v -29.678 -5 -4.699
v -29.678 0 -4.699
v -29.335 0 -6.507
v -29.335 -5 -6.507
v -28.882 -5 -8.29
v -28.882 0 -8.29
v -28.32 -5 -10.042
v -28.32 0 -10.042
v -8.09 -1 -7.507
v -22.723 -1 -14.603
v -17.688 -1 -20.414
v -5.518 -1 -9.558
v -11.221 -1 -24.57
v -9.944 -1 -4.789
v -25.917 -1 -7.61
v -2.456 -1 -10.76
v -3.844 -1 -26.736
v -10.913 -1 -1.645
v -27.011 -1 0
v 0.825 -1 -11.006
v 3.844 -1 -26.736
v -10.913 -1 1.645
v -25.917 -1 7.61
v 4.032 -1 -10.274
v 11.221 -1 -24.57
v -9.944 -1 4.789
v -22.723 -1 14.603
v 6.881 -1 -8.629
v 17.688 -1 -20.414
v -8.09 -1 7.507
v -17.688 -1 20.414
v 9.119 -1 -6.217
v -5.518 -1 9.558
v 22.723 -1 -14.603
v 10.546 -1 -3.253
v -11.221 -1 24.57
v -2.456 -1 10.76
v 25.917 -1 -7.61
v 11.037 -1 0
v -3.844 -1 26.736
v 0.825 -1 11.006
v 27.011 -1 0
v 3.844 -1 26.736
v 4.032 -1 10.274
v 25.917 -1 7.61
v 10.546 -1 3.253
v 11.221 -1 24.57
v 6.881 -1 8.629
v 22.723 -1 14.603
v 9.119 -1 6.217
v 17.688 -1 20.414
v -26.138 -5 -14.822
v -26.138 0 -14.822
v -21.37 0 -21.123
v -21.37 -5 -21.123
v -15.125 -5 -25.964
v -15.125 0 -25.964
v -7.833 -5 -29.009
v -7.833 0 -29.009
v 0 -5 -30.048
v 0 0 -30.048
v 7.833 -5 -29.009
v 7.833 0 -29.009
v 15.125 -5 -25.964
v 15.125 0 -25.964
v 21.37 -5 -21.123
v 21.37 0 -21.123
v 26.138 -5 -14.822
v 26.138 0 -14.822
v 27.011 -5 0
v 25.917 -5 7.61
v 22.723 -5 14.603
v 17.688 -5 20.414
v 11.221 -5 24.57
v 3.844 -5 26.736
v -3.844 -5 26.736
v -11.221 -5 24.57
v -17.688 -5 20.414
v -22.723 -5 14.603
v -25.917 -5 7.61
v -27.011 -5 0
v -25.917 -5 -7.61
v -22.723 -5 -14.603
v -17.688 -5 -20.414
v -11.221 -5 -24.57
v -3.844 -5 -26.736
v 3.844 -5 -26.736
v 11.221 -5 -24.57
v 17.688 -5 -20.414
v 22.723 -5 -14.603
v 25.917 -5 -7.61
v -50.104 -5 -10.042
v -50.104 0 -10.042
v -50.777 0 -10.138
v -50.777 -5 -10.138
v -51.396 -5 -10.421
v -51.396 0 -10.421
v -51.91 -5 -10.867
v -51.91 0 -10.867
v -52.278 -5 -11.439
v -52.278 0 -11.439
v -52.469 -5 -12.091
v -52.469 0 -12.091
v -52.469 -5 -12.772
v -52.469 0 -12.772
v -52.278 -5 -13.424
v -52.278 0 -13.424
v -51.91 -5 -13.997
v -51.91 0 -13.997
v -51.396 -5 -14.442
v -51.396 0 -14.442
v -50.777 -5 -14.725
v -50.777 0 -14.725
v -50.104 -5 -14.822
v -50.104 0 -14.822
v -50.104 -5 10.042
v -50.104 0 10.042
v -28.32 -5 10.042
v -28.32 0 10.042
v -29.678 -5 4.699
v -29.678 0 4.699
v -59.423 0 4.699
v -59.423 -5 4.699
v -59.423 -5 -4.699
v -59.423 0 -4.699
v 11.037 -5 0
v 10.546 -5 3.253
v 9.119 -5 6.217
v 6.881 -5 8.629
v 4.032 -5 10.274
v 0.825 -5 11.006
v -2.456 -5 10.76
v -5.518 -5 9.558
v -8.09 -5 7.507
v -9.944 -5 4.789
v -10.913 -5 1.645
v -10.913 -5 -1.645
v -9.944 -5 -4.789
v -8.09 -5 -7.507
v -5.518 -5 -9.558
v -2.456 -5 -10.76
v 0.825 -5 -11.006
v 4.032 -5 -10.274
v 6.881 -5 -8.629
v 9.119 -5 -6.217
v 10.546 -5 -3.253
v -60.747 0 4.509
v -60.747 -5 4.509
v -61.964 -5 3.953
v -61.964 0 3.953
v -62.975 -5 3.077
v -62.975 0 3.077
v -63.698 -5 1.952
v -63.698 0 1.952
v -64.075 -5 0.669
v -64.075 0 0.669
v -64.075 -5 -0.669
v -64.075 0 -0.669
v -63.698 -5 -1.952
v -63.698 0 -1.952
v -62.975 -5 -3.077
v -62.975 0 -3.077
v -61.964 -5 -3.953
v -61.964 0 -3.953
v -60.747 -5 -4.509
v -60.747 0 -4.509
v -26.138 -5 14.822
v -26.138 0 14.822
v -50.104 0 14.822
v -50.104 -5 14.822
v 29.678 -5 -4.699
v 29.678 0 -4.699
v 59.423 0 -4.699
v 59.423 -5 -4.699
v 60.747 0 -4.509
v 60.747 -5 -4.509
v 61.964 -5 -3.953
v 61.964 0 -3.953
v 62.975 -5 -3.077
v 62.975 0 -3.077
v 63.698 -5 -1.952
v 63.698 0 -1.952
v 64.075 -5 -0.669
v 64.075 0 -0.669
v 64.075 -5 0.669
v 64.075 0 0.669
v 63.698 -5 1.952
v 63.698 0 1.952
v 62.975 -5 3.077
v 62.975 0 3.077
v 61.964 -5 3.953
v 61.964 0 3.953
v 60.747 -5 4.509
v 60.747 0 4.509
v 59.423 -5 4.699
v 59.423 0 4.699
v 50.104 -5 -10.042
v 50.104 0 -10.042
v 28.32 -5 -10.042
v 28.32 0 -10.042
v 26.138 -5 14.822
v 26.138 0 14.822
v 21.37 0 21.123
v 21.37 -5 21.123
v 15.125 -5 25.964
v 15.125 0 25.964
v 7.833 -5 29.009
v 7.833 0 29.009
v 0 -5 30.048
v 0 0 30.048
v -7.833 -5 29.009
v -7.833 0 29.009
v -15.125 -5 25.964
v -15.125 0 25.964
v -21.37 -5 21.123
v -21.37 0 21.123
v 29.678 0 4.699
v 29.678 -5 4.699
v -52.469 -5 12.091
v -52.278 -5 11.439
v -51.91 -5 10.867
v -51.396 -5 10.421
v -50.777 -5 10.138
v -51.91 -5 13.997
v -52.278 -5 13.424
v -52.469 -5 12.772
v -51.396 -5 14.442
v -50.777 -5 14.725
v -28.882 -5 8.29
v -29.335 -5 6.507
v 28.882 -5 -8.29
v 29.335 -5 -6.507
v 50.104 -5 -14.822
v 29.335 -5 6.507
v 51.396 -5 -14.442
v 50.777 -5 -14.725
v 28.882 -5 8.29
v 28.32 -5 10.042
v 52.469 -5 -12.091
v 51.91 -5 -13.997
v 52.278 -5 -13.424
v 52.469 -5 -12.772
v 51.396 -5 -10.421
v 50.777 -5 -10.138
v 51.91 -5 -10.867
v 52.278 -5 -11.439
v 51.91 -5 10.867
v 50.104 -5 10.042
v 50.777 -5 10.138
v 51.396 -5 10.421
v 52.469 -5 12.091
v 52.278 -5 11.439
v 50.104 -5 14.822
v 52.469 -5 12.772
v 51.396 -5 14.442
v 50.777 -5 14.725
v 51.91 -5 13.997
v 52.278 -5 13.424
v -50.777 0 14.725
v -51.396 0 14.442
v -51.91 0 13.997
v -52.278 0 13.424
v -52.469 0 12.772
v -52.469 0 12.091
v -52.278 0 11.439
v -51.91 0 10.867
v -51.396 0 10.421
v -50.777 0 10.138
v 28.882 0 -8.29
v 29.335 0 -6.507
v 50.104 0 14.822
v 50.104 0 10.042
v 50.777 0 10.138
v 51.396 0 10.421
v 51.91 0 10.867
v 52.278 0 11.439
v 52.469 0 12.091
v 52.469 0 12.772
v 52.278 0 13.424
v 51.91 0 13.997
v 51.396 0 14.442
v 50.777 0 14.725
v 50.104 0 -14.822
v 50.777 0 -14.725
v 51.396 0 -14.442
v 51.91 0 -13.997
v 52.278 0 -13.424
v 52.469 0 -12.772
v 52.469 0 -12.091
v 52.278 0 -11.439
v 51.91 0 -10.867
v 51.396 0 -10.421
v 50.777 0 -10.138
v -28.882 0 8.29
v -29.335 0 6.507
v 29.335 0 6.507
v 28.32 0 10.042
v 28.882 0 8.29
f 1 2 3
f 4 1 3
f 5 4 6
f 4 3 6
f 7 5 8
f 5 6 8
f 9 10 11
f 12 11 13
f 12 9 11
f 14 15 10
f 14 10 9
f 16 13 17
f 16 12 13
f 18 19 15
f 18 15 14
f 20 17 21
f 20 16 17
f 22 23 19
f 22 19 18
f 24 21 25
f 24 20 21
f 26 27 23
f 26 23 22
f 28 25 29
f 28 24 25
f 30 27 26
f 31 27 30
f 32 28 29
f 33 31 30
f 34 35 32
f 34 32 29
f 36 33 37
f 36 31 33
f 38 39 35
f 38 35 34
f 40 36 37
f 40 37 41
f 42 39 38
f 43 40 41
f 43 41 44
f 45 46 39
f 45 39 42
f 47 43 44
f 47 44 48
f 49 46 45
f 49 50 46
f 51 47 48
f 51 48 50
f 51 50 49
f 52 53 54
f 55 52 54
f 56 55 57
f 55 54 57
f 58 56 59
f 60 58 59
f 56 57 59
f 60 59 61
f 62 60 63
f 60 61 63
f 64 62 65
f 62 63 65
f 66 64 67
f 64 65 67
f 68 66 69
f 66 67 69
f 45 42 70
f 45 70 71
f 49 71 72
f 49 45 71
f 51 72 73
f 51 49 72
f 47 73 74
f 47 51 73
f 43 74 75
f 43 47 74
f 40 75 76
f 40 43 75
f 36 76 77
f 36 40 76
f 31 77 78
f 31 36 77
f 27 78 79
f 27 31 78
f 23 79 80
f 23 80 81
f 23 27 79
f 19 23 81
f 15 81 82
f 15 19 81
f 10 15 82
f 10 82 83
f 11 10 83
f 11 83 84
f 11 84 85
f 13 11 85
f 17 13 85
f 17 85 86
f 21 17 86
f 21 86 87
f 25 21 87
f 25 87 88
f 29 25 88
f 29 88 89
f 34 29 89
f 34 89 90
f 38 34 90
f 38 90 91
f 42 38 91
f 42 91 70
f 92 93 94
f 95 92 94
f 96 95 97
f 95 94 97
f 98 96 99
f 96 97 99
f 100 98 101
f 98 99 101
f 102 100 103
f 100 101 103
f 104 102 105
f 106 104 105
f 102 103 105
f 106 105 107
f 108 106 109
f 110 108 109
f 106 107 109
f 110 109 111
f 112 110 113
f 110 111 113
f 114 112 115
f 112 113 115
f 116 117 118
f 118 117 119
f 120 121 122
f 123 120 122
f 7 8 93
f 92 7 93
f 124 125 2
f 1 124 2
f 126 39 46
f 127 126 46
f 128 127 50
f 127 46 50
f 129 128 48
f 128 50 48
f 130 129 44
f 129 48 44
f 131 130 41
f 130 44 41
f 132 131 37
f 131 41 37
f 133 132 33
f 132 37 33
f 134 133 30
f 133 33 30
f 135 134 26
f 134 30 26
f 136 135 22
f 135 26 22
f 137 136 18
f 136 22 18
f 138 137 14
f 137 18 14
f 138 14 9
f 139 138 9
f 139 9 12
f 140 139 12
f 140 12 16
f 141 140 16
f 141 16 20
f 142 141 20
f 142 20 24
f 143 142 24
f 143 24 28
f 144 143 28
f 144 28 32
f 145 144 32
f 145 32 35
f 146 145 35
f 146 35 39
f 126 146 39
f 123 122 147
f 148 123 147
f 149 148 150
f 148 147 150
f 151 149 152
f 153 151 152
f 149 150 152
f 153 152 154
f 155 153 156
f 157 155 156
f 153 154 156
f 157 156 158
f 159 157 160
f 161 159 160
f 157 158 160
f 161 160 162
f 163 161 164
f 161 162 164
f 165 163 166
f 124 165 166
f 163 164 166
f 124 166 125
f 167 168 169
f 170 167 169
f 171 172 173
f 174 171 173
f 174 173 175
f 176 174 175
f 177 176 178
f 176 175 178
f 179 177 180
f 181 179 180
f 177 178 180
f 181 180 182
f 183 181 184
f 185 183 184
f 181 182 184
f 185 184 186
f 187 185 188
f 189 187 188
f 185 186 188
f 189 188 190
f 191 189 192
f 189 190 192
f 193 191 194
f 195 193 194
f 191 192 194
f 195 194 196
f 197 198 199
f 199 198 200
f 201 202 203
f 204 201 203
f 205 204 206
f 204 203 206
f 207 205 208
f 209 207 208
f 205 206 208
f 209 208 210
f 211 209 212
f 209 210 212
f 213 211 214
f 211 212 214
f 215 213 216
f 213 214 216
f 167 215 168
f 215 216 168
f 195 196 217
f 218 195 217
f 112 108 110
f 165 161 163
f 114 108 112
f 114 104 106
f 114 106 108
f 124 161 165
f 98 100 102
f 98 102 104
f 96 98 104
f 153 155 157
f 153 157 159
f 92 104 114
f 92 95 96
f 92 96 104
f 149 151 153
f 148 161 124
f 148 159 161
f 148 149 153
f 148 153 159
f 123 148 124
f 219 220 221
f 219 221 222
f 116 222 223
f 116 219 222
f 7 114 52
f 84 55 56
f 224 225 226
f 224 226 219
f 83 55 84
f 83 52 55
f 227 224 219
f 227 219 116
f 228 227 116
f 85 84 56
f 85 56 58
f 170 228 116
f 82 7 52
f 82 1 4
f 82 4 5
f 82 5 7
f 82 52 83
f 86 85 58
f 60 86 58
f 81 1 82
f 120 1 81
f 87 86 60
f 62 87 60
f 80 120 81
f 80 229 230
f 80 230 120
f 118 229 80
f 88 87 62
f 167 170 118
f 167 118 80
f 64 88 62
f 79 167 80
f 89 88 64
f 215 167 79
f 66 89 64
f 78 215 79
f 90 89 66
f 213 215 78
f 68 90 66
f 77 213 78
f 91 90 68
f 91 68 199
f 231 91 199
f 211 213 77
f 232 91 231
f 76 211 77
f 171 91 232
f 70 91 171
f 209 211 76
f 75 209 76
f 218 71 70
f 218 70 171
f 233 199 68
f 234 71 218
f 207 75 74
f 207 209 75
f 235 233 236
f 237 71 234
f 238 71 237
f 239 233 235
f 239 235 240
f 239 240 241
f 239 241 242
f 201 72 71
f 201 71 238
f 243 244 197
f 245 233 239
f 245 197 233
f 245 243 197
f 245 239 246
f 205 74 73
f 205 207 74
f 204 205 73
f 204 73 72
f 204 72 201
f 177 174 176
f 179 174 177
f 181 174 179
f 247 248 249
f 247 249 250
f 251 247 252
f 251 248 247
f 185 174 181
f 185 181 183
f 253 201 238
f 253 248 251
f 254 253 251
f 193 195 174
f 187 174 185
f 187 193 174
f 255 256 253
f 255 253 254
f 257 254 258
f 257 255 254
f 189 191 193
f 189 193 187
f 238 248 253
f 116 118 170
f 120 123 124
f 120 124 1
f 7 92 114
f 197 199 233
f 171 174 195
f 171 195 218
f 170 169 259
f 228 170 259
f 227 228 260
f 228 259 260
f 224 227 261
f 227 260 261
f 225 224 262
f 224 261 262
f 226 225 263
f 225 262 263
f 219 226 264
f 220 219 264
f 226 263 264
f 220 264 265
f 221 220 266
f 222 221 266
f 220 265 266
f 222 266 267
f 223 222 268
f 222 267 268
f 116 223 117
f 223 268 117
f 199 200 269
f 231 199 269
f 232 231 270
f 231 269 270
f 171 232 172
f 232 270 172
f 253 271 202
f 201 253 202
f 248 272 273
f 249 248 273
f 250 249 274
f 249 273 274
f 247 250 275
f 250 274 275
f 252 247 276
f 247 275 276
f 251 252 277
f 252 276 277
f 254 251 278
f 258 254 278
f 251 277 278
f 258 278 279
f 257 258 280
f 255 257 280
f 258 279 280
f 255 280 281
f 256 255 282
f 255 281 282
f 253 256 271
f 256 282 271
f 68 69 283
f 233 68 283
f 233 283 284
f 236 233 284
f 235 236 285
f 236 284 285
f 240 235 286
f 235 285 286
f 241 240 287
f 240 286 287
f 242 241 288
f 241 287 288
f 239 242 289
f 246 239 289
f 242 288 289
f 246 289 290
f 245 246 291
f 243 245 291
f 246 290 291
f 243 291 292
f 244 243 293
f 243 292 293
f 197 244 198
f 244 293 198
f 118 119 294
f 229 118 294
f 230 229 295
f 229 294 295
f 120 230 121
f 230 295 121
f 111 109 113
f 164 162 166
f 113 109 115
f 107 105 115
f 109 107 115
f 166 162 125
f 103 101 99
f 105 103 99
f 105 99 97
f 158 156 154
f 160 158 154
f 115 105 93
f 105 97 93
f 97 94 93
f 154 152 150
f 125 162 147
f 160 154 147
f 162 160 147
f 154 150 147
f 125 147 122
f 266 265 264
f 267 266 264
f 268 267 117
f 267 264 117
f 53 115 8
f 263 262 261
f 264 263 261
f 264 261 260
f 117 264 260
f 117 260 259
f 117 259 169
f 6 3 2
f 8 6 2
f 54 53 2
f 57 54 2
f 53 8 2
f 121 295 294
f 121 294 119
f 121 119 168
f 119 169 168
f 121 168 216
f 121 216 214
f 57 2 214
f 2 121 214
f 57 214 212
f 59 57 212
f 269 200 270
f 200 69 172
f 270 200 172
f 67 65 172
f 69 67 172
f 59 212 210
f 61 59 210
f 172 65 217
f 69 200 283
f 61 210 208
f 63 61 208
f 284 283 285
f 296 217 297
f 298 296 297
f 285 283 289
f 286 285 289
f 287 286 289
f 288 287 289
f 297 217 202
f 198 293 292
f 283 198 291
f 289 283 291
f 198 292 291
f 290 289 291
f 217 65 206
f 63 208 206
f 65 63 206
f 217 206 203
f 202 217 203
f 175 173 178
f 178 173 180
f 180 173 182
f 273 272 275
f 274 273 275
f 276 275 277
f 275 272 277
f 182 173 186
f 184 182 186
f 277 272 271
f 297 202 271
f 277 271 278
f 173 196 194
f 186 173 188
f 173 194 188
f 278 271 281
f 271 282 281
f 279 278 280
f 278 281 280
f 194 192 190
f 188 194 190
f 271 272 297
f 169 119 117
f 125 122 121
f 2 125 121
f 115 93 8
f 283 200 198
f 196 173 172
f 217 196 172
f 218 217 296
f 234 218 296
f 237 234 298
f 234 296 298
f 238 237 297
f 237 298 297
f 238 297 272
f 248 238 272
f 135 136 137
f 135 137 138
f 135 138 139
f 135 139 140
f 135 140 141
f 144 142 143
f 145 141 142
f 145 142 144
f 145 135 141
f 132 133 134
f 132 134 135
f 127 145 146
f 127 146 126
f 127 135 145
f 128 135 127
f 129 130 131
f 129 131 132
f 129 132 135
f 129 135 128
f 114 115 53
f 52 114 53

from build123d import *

# Parameters (mm, degrees)
F0_R     = 27.011072
F0_R_2   = 11.036563
F1_DEPTH = 1
F2_DEPTH = 5


with BuildPart() as f1:
    # F0 (on Front) → F1 (new body)
    with BuildSketch(Plane.XZ):
        Circle(F0_R)
        Circle(F0_R_2, mode=Mode.SUBTRACT)
    extrude(amount=F1_DEPTH)

    # F0 (on Front) → F2 (join)
    with BuildSketch(Plane.XZ):
        with BuildLine():
            ThreePointArc((29.67797, -4.699063), (29.95511, -2.356792), (30.04768, 0))
            ThreePointArc((30.04768, 0), (29.95511, 2.356792), (29.67797, 4.699063))
            ThreePointArc((29.67797, 4.699063), (29.121812, 7.401566), (28.320102, 10.04166))
            ThreePointArc((28.320102, 10.04166), (27.333629, 12.479416), (26.137785, 14.821582))
            ThreePointArc((26.137785, 14.821582), (0, 30.04768), (-26.137785, 14.821582))
            ThreePointArc((-26.137785, 14.821582), (-27.333629, 12.479416), (-28.320102, 10.04166))
            ThreePointArc((-28.320102, 10.04166), (-29.121812, 7.401566), (-29.67797, 4.699063))
            ThreePointArc((-29.67797, 4.699063), (-30.04768, 0), (-29.67797, -4.699063))
            ThreePointArc((-29.67797, -4.699063), (-29.121812, -7.401566), (-28.320102, -10.04166))
            ThreePointArc((-28.320102, -10.04166), (-27.333629, -12.479416), (-26.137785, -14.821582))
            ThreePointArc((-26.137785, -14.821582), (0, -30.04768), (26.137785, -14.821582))
            ThreePointArc((26.137785, -14.821582), (27.333629, -12.479416), (28.320102, -10.04166))
            ThreePointArc((28.320102, -10.04166), (29.121812, -7.401566), (29.67797, -4.699063))
        make_face()
        Circle(F0_R, mode=Mode.SUBTRACT)
        Circle(F0_R_2)
        with BuildLine():
            ThreePointArc((26.137785, 14.821582), (27.333629, 12.479416), (28.320102, 10.04166))
            Line((28.320102, 10.04166), (50.103527, 10.04166))
            ThreePointArc((50.103527, 10.04166), (52.493488, 12.431621), (50.103527, 14.821582))
            Line((50.103527, 14.821582), (26.137785, 14.821582))
        make_face()
        with BuildLine():
            ThreePointArc((29.67797, 4.699063), (29.95511, 2.356792), (30.04768, 0))
            ThreePointArc((30.04768, 0), (29.95511, -2.356792), (29.67797, -4.699063))
            Line((29.67797, -4.699063), (59.423488, -4.699063))
            ThreePointArc((59.423488, -4.699063), (64.122551, 0), (59.423488, 4.699063))
            Line((59.423488, 4.699063), (29.67797, 4.699063))
        make_face()
        with BuildLine():
            Line((50.103527, -10.04166), (28.320102, -10.04166))
            ThreePointArc((28.320102, -10.04166), (27.333629, -12.479416), (26.137785, -14.821582))
            Line((26.137785, -14.821582), (50.103527, -14.821582))
            ThreePointArc((50.103527, -14.821582), (52.493488, -12.431621), (50.103527, -10.04166))
        make_face()
        with BuildLine():
            Line((-50.103527, -14.821582), (-26.137785, -14.821582))
            ThreePointArc((-26.137785, -14.821582), (-27.333629, -12.479416), (-28.320102, -10.04166))
            Line((-28.320102, -10.04166), (-50.103527, -10.04166))
            ThreePointArc((-50.103527, -10.04166), (-52.493488, -12.431621), (-50.103527, -14.821582))
        make_face()
        with BuildLine():
            ThreePointArc((-29.67797, -4.699063), (-30.04768, 0), (-29.67797, 4.699063))
            Line((-29.67797, 4.699063), (-59.423488, 4.699063))
            ThreePointArc((-59.423488, 4.699063), (-64.122551, 0), (-59.423488, -4.699063))
            Line((-59.423488, -4.699063), (-29.67797, -4.699063))
        make_face()
        with BuildLine():
            ThreePointArc((-28.320102, 10.04166), (-27.333629, 12.479416), (-26.137785, 14.821582))
            Line((-26.137785, 14.821582), (-50.103527, 14.821582))
            ThreePointArc((-50.103527, 14.821582), (-52.493488, 12.431621), (-50.103527, 10.04166))
            Line((-50.103527, 10.04166), (-28.320102, 10.04166))
        make_face()
    extrude(amount=F2_DEPTH)


solid = f1.part
